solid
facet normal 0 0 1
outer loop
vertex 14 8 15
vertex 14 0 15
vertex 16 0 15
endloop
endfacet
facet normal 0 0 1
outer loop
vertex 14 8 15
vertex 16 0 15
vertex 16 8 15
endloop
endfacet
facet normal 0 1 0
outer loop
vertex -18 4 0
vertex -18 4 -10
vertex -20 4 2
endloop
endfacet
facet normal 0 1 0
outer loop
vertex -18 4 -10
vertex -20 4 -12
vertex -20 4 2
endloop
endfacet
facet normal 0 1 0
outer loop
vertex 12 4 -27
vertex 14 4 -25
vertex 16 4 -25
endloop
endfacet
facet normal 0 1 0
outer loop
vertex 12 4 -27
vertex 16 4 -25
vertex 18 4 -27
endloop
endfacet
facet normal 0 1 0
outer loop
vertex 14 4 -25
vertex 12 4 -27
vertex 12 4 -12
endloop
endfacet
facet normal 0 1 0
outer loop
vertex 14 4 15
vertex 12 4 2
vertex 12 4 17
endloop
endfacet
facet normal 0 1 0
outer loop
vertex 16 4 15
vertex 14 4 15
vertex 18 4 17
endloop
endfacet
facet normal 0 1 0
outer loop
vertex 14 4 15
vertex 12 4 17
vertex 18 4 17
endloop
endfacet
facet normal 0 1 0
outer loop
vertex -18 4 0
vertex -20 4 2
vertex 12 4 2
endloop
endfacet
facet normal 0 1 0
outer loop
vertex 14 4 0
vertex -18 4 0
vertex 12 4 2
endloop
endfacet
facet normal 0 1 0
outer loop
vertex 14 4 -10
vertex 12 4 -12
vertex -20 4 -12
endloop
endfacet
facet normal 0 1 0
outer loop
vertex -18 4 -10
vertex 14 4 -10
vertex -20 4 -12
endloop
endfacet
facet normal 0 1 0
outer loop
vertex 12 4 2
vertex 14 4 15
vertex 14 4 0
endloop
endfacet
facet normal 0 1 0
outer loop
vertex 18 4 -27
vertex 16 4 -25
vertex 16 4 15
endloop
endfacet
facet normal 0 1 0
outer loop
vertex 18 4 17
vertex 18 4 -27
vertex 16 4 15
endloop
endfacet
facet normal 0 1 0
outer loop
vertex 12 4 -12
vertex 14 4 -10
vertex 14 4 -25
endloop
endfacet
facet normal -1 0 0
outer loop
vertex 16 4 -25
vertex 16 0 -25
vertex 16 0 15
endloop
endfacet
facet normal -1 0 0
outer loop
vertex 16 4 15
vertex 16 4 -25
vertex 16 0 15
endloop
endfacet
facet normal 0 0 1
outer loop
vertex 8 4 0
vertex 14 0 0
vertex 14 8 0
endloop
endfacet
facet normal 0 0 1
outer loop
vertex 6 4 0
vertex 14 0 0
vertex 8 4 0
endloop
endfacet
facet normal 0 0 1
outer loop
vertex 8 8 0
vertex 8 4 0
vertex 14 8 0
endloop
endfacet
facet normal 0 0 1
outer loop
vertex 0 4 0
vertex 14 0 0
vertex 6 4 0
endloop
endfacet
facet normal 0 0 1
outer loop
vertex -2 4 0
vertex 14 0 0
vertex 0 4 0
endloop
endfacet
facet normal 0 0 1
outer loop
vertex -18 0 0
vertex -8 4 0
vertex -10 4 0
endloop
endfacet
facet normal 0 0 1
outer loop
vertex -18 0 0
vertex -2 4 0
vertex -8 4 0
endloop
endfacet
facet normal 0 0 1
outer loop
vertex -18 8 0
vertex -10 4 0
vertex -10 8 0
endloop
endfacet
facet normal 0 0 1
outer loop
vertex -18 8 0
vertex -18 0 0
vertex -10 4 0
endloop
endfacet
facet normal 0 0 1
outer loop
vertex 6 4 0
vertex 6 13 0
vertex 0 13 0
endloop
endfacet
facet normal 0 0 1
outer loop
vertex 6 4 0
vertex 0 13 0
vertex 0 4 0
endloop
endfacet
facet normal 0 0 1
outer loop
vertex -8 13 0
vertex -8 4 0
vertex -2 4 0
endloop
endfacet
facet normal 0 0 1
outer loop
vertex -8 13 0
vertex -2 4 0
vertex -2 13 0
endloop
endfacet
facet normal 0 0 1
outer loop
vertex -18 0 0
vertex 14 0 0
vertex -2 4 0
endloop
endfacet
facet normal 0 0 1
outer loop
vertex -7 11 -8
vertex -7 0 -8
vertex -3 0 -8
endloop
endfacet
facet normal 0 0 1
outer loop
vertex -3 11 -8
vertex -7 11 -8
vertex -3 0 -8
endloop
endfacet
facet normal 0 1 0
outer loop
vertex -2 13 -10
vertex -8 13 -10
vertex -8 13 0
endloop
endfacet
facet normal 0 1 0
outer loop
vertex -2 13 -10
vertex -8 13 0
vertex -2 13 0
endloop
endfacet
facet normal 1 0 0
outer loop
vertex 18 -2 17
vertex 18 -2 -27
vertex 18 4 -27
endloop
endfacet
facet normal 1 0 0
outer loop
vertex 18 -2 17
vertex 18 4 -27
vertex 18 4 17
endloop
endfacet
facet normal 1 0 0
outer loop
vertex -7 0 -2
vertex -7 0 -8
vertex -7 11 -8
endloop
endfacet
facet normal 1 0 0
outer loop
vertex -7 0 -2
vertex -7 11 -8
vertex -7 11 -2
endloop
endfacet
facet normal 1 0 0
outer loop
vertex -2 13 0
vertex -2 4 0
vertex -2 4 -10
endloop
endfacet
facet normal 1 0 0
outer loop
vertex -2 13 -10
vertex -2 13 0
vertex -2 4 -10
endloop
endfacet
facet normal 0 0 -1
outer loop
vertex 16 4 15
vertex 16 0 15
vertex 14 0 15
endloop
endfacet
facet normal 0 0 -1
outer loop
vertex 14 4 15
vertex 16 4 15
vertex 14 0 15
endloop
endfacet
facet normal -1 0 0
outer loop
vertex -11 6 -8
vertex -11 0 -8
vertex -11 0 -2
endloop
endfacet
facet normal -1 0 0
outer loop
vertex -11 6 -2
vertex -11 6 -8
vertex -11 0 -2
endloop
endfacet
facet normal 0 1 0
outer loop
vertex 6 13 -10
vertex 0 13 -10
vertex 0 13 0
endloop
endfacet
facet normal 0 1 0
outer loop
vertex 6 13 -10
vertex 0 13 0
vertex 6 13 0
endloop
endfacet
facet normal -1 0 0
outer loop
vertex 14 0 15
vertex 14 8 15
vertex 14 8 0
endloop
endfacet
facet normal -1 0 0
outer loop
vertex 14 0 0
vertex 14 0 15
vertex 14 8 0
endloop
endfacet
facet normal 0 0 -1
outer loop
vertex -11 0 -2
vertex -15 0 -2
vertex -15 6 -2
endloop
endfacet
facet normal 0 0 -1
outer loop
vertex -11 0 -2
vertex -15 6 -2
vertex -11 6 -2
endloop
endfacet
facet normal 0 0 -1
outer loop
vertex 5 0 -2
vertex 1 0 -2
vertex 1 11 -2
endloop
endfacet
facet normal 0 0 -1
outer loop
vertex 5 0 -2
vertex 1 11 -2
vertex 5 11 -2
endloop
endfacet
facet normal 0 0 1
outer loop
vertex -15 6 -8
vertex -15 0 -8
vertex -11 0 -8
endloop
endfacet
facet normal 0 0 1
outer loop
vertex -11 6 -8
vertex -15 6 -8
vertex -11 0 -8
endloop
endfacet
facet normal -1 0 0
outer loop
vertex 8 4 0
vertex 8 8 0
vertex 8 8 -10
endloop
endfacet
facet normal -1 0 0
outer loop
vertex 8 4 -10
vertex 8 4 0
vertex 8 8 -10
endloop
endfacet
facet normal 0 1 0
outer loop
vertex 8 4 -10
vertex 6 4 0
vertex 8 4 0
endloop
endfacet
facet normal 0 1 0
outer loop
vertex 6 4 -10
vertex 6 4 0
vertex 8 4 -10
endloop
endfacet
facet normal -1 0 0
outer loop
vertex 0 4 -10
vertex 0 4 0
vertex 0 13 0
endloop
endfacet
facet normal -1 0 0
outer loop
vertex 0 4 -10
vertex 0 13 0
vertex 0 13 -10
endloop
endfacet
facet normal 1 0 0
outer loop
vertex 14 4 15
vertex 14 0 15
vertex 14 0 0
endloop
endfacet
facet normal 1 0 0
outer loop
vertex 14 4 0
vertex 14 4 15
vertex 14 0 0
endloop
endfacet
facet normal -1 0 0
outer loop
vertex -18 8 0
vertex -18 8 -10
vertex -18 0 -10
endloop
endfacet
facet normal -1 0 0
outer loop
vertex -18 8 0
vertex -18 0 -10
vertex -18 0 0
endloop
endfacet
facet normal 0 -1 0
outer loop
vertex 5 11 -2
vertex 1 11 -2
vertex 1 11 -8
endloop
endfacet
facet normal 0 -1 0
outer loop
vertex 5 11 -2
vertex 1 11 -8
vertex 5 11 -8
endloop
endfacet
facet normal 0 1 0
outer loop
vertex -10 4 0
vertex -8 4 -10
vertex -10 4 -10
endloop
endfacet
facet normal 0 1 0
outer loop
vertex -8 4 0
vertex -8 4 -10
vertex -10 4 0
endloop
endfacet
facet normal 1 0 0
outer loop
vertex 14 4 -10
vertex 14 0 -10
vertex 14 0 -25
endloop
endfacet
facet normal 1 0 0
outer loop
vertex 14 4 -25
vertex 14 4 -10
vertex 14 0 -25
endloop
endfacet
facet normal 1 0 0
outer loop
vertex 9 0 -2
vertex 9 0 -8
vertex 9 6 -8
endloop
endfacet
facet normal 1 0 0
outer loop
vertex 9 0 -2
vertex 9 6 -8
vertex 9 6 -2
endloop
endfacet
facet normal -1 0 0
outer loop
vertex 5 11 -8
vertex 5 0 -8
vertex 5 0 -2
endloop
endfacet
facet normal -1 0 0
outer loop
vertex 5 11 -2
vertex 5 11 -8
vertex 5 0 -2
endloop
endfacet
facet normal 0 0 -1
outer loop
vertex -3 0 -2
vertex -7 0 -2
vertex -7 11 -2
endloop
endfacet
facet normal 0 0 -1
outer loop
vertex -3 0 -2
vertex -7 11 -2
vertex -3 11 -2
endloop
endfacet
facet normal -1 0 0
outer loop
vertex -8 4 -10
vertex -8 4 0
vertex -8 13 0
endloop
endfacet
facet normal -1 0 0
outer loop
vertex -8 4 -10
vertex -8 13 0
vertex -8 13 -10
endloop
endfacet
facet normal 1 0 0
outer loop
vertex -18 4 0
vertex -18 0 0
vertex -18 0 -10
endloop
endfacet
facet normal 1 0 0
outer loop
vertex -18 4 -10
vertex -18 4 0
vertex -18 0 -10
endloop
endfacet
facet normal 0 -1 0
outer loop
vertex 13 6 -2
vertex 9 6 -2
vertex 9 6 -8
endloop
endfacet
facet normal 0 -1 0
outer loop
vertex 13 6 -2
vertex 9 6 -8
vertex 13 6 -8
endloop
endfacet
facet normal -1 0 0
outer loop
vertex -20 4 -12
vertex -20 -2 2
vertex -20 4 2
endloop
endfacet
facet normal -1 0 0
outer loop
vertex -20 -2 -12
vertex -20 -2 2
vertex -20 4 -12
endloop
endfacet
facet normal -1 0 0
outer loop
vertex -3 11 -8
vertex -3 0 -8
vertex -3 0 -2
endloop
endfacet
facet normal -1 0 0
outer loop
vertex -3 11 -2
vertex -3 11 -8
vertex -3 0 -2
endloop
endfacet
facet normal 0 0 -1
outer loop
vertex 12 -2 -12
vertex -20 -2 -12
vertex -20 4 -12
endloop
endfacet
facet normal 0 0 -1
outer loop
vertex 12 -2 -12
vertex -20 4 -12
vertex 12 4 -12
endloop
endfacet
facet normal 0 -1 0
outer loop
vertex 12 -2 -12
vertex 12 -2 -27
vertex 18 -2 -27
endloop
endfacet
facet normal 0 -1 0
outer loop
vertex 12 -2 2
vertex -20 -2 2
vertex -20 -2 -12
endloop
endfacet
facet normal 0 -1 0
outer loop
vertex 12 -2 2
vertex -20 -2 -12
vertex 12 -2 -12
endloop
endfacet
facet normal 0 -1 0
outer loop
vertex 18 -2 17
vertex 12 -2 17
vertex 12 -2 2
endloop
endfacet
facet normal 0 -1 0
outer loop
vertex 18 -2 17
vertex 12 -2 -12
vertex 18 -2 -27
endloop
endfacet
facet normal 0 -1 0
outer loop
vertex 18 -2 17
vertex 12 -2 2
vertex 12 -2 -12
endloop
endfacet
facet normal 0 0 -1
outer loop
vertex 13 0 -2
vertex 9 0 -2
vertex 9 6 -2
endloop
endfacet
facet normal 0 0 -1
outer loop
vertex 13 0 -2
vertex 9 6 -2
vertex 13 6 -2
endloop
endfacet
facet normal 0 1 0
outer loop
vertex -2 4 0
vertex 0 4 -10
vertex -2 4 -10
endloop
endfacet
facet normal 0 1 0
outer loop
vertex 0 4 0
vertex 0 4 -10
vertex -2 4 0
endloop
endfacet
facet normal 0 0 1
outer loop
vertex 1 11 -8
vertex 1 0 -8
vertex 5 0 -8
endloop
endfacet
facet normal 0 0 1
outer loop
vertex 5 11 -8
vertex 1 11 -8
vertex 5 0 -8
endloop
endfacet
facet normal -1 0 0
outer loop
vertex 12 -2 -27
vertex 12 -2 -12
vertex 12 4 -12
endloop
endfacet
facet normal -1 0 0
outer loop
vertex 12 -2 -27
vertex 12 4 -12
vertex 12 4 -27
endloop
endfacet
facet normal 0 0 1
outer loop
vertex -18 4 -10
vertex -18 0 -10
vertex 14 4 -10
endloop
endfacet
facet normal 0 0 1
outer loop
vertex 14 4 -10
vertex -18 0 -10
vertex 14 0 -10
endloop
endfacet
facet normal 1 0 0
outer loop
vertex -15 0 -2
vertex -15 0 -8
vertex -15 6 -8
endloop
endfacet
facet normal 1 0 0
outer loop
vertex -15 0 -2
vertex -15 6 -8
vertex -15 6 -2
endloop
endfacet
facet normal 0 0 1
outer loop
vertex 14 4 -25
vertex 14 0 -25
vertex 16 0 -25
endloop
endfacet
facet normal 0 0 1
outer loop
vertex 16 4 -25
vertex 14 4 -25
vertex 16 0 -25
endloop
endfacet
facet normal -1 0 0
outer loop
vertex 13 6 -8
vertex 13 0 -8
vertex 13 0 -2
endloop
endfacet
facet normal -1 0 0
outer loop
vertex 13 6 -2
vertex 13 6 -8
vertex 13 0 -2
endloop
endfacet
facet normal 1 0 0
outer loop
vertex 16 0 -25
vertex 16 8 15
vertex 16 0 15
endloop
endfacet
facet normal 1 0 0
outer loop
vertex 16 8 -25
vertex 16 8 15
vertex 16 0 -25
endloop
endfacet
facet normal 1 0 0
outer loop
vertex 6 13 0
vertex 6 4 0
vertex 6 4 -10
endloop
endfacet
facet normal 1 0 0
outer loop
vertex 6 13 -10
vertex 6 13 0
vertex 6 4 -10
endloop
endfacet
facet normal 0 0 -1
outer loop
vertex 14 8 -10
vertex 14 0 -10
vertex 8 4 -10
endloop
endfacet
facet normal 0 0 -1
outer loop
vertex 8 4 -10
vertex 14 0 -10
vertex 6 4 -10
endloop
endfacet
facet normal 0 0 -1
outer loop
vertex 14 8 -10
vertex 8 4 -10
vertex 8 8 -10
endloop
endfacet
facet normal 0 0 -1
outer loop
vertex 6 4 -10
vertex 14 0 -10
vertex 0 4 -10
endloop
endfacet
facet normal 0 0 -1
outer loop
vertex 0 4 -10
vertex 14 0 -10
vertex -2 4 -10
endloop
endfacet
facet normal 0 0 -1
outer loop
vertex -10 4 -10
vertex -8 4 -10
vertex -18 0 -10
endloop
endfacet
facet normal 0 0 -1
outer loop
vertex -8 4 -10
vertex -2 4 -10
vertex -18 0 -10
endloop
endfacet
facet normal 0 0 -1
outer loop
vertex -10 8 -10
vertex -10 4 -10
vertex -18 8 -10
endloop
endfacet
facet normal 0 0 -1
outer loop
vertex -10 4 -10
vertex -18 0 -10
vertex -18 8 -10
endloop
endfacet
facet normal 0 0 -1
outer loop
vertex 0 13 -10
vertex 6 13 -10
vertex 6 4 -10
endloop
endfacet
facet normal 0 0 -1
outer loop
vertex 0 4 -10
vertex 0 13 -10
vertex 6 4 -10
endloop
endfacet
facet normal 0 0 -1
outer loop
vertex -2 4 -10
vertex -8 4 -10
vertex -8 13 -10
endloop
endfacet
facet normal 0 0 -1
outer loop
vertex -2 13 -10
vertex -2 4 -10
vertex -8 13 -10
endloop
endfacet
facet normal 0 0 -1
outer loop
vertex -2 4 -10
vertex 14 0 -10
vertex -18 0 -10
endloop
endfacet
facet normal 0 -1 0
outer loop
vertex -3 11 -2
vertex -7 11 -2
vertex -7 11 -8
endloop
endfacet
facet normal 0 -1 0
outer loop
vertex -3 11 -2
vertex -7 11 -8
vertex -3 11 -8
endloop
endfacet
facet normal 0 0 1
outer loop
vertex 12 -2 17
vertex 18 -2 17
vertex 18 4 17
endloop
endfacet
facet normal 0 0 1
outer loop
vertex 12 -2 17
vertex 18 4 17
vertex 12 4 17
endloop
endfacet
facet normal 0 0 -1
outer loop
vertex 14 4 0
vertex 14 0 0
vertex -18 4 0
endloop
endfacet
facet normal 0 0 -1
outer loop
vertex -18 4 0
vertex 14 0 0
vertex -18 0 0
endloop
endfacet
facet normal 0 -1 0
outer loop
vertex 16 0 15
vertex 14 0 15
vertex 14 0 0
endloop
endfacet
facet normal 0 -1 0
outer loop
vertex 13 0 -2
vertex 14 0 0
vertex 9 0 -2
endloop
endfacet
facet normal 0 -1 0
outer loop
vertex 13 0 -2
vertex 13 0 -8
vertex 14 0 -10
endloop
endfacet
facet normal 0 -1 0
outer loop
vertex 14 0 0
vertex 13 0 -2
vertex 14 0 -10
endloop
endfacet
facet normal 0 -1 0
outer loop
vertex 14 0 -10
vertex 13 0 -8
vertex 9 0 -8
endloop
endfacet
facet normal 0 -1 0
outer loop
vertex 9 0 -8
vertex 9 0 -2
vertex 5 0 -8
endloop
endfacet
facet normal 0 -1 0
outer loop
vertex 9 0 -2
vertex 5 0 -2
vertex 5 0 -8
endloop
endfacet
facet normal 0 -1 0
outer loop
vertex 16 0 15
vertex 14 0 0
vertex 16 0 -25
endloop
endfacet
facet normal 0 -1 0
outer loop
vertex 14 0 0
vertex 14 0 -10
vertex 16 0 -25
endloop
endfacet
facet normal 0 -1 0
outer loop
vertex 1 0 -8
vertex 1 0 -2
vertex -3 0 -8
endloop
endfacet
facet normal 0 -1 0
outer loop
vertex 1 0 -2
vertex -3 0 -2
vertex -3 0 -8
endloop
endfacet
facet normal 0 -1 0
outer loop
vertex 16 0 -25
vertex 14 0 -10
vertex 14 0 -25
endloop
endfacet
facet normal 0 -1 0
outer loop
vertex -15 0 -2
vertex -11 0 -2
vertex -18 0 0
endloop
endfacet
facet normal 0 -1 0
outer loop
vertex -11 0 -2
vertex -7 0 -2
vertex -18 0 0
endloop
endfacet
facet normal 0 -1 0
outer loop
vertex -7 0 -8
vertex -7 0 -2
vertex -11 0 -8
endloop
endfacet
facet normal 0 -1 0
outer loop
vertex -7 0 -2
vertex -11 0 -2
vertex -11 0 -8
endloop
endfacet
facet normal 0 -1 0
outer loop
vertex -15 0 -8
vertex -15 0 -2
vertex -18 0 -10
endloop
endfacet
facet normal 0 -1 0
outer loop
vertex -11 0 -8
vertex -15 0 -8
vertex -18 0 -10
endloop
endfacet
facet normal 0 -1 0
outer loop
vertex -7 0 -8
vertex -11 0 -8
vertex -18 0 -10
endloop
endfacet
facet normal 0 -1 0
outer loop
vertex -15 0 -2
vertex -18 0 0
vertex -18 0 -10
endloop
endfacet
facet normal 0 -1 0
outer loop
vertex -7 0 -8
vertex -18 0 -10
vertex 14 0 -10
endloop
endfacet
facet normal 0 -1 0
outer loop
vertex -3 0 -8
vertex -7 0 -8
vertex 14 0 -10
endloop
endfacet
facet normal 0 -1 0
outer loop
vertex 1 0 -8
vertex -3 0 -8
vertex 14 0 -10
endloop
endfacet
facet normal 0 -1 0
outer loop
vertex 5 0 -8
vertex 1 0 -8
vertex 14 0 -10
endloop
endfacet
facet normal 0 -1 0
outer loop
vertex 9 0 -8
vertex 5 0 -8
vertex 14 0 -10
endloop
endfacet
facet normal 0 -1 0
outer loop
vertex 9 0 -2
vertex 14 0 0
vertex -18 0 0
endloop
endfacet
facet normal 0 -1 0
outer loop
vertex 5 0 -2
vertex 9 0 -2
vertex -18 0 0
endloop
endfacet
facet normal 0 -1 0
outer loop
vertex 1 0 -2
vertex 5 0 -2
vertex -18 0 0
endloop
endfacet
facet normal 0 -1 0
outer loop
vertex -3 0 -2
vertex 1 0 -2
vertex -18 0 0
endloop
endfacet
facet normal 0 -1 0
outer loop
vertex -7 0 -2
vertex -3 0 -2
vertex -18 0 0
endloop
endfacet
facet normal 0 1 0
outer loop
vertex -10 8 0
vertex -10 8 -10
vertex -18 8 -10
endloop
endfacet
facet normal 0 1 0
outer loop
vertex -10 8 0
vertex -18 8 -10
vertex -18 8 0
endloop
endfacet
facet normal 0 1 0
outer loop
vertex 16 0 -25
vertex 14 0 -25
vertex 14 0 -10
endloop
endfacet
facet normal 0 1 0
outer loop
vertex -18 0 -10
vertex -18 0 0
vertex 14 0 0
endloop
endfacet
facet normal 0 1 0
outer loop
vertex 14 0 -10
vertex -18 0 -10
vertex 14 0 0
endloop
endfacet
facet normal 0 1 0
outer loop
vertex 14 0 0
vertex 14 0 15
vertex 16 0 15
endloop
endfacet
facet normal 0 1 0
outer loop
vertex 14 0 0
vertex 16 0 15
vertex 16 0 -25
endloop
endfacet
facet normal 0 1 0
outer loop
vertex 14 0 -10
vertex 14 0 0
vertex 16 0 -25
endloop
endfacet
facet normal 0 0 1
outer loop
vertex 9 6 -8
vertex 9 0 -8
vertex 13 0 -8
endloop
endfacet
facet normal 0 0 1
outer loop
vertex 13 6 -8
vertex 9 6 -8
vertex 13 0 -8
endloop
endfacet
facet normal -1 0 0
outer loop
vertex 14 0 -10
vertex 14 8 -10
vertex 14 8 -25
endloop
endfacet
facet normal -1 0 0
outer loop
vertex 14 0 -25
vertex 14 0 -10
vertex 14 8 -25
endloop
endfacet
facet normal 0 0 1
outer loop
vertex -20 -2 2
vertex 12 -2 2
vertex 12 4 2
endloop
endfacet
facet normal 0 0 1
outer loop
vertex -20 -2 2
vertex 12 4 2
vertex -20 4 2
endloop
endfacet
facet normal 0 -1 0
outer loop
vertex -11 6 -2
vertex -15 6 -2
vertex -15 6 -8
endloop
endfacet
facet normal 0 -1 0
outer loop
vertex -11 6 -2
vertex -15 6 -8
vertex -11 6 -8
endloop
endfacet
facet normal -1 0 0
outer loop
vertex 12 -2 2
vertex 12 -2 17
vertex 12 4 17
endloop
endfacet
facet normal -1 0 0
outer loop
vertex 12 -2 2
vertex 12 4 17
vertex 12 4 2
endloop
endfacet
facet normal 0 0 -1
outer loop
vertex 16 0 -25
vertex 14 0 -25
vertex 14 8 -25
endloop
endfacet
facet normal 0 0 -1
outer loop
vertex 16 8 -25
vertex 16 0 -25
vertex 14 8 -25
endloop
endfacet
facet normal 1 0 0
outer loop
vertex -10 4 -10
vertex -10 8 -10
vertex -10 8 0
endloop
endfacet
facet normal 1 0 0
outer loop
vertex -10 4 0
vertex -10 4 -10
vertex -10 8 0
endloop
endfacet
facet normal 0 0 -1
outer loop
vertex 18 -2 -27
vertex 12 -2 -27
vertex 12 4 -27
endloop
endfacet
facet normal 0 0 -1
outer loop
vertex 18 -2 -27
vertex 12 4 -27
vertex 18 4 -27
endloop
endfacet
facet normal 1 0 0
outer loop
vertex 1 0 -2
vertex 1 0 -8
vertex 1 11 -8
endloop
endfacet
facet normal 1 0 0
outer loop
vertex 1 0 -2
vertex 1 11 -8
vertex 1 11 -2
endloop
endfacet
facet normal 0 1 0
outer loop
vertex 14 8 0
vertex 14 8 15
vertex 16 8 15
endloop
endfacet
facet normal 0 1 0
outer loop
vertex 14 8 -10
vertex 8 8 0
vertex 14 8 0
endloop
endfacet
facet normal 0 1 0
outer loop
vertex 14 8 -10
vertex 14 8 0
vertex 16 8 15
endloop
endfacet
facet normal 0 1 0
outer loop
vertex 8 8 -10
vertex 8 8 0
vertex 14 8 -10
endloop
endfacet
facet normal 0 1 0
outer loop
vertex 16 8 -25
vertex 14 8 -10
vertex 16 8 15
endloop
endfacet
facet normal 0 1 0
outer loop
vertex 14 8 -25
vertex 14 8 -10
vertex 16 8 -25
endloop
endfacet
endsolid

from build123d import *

# Parameters (mm, degrees)
SKETCH1_W            = 6
SKETCH1_H            = 10
BOSS_EXTRUDE1_DEPTH  = 13
SKETCH2_W            = 4
SKETCH2_H            = 6
CUT_EXTRUDE1_DEPTH   = 11
SKETCH3_W            = 10
SKETCH3_H            = 4
BOSS_EXTRUDE2_DEPTH  = 2
LPATTERN1_COUNT      = 2
LPATTERN1_PITCH      = 8
SKETCH18_W           = 10
SKETCH18_H           = 8
BOSS_EXTRUDE3_DEPTH  = 8
SKETCH20_W           = 10
SKETCH20_H           = 4
BOSS_EXTRUDE4_DEPTH  = 2
SKETCH21_W           = 10
SKETCH21_H           = 8
BOSS_EXTRUDE5_DEPTH  = 6
SKETCH22_W           = 40
SKETCH22_H           = 8
BOSS_EXTRUDE6_DEPTH  = 2
SKETCH23_W           = 4
SKETCH23_H           = 6
CUT_EXTRUDE2_DEPTH   = 6
BOSS_EXTRUDE15_DEPTH = 2
BOSS_EXTRUDE16_DEPTH = 6


with BuildPart() as part:
    # Sketch1 → Boss-Extrude1 (new body)
    with BuildSketch(Plane(origin=(0, 0, 0), x_dir=(1, 0, 0), z_dir=(0, 1, 0))):
        with Locations((3, 5)):
            Rectangle(SKETCH1_W, SKETCH1_H)
    extrude(amount=BOSS_EXTRUDE1_DEPTH)

    # Sketch2 → Cut-Extrude1 (cut)
    with BuildSketch(Plane.XZ):
        with Locations((3, -5)):
            Rectangle(SKETCH2_W, SKETCH2_H)
    extrude(amount=-CUT_EXTRUDE1_DEPTH, mode=Mode.SUBTRACT)

    # Sketch3 → Boss-Extrude2 (add)
    with BuildSketch(Plane.ZY):
        with Locations((-5, 2)):
            Rectangle(SKETCH3_W, SKETCH3_H)
    extrude(amount=BOSS_EXTRUDE2_DEPTH)


with BuildPart() as lpattern1_1:
    # LPattern1: pattern copy
    add(part.part.moved(Location(Vector(-1, 0, 0) * (1 * LPATTERN1_PITCH))))

    # Sketch18 → Boss-Extrude3 (add)
    with BuildSketch(Plane.ZY.offset(10)):
        with Locations((-5, 4)):
            Rectangle(SKETCH18_W, SKETCH18_H)
    extrude(amount=BOSS_EXTRUDE3_DEPTH)


with BuildPart() as part_1:
    add(part.part)

    # Sketch20 → Boss-Extrude4 (add)
    with BuildSketch(Plane(origin=(6, 0, 0), x_dir=(0, 0, -1), z_dir=(1, 0, 0))):
        with Locations((5, 2)):
            Rectangle(SKETCH20_W, SKETCH20_H)
    extrude(amount=BOSS_EXTRUDE4_DEPTH)

    # Sketch21 → Boss-Extrude5 (add)
    with BuildSketch(Plane(origin=(8, 0, 0), x_dir=(0, 0, -1), z_dir=(1, 0, 0))):
        with Locations((5, 4)):
            Rectangle(SKETCH21_W, SKETCH21_H)
    extrude(amount=BOSS_EXTRUDE5_DEPTH)

    # Sketch22 → Boss-Extrude6 (add)
    with BuildSketch(Plane(origin=(14, 0, 0), x_dir=(0, 0, -1), z_dir=(1, 0, 0))):
        with Locations((5, 4)):
            Rectangle(SKETCH22_W, SKETCH22_H)
    extrude(amount=BOSS_EXTRUDE6_DEPTH)


with BuildPart() as cut_extrude2_tool:
    # Sketch23 → Cut-Extrude2 (new body)
    with BuildSketch(Plane.XZ):
        with Locations((11, -5)):
            Rectangle(SKETCH23_W, SKETCH23_H)
        with Locations((-13, -5)):
            Rectangle(SKETCH23_W, SKETCH23_H)
    extrude(amount=-CUT_EXTRUDE2_DEPTH)


with BuildPart() as part_2:
    add(part_1.part)

    # Cut-Extrude2: cut by cut_extrude2_tool
    add(cut_extrude2_tool.part, mode=Mode.SUBTRACT)


with BuildPart() as lpattern1_1_1:
    add(lpattern1_1.part)

    # Cut-Extrude2: cut by cut_extrude2_tool
    add(cut_extrude2_tool.part, mode=Mode.SUBTRACT)

    # Combine1: union part
    add(part_2.part)


with BuildPart() as body_2:
    # Sketch33 → Boss-Extrude15 (new body)
    with BuildSketch(Plane.XZ):
        Polygon((14, 0), (-18, 0), (-18, -10), (14, -10), (14, -25), (16, -25), (16, 15), (14, 15), align=None)
    extrude(amount=BOSS_EXTRUDE15_DEPTH)

    # Sketch34 → Boss-Extrude16 (add)
    with BuildSketch(Plane.XZ.offset(2)):
        Polygon((12, 17), (12, 2), (-20, 2), (-20, -12), (12, -12), (12, -27), (18, -27), (18, 17), align=None)
        Polygon((14, 15), (14, 0), (-18, 0), (-18, -10), (14, -10), (14, -25), (16, -25), (16, 15), align=None, mode=Mode.SUBTRACT)
    extrude(amount=-BOSS_EXTRUDE16_DEPTH)


solid = Compound([lpattern1_1_1.part, body_2.part])
